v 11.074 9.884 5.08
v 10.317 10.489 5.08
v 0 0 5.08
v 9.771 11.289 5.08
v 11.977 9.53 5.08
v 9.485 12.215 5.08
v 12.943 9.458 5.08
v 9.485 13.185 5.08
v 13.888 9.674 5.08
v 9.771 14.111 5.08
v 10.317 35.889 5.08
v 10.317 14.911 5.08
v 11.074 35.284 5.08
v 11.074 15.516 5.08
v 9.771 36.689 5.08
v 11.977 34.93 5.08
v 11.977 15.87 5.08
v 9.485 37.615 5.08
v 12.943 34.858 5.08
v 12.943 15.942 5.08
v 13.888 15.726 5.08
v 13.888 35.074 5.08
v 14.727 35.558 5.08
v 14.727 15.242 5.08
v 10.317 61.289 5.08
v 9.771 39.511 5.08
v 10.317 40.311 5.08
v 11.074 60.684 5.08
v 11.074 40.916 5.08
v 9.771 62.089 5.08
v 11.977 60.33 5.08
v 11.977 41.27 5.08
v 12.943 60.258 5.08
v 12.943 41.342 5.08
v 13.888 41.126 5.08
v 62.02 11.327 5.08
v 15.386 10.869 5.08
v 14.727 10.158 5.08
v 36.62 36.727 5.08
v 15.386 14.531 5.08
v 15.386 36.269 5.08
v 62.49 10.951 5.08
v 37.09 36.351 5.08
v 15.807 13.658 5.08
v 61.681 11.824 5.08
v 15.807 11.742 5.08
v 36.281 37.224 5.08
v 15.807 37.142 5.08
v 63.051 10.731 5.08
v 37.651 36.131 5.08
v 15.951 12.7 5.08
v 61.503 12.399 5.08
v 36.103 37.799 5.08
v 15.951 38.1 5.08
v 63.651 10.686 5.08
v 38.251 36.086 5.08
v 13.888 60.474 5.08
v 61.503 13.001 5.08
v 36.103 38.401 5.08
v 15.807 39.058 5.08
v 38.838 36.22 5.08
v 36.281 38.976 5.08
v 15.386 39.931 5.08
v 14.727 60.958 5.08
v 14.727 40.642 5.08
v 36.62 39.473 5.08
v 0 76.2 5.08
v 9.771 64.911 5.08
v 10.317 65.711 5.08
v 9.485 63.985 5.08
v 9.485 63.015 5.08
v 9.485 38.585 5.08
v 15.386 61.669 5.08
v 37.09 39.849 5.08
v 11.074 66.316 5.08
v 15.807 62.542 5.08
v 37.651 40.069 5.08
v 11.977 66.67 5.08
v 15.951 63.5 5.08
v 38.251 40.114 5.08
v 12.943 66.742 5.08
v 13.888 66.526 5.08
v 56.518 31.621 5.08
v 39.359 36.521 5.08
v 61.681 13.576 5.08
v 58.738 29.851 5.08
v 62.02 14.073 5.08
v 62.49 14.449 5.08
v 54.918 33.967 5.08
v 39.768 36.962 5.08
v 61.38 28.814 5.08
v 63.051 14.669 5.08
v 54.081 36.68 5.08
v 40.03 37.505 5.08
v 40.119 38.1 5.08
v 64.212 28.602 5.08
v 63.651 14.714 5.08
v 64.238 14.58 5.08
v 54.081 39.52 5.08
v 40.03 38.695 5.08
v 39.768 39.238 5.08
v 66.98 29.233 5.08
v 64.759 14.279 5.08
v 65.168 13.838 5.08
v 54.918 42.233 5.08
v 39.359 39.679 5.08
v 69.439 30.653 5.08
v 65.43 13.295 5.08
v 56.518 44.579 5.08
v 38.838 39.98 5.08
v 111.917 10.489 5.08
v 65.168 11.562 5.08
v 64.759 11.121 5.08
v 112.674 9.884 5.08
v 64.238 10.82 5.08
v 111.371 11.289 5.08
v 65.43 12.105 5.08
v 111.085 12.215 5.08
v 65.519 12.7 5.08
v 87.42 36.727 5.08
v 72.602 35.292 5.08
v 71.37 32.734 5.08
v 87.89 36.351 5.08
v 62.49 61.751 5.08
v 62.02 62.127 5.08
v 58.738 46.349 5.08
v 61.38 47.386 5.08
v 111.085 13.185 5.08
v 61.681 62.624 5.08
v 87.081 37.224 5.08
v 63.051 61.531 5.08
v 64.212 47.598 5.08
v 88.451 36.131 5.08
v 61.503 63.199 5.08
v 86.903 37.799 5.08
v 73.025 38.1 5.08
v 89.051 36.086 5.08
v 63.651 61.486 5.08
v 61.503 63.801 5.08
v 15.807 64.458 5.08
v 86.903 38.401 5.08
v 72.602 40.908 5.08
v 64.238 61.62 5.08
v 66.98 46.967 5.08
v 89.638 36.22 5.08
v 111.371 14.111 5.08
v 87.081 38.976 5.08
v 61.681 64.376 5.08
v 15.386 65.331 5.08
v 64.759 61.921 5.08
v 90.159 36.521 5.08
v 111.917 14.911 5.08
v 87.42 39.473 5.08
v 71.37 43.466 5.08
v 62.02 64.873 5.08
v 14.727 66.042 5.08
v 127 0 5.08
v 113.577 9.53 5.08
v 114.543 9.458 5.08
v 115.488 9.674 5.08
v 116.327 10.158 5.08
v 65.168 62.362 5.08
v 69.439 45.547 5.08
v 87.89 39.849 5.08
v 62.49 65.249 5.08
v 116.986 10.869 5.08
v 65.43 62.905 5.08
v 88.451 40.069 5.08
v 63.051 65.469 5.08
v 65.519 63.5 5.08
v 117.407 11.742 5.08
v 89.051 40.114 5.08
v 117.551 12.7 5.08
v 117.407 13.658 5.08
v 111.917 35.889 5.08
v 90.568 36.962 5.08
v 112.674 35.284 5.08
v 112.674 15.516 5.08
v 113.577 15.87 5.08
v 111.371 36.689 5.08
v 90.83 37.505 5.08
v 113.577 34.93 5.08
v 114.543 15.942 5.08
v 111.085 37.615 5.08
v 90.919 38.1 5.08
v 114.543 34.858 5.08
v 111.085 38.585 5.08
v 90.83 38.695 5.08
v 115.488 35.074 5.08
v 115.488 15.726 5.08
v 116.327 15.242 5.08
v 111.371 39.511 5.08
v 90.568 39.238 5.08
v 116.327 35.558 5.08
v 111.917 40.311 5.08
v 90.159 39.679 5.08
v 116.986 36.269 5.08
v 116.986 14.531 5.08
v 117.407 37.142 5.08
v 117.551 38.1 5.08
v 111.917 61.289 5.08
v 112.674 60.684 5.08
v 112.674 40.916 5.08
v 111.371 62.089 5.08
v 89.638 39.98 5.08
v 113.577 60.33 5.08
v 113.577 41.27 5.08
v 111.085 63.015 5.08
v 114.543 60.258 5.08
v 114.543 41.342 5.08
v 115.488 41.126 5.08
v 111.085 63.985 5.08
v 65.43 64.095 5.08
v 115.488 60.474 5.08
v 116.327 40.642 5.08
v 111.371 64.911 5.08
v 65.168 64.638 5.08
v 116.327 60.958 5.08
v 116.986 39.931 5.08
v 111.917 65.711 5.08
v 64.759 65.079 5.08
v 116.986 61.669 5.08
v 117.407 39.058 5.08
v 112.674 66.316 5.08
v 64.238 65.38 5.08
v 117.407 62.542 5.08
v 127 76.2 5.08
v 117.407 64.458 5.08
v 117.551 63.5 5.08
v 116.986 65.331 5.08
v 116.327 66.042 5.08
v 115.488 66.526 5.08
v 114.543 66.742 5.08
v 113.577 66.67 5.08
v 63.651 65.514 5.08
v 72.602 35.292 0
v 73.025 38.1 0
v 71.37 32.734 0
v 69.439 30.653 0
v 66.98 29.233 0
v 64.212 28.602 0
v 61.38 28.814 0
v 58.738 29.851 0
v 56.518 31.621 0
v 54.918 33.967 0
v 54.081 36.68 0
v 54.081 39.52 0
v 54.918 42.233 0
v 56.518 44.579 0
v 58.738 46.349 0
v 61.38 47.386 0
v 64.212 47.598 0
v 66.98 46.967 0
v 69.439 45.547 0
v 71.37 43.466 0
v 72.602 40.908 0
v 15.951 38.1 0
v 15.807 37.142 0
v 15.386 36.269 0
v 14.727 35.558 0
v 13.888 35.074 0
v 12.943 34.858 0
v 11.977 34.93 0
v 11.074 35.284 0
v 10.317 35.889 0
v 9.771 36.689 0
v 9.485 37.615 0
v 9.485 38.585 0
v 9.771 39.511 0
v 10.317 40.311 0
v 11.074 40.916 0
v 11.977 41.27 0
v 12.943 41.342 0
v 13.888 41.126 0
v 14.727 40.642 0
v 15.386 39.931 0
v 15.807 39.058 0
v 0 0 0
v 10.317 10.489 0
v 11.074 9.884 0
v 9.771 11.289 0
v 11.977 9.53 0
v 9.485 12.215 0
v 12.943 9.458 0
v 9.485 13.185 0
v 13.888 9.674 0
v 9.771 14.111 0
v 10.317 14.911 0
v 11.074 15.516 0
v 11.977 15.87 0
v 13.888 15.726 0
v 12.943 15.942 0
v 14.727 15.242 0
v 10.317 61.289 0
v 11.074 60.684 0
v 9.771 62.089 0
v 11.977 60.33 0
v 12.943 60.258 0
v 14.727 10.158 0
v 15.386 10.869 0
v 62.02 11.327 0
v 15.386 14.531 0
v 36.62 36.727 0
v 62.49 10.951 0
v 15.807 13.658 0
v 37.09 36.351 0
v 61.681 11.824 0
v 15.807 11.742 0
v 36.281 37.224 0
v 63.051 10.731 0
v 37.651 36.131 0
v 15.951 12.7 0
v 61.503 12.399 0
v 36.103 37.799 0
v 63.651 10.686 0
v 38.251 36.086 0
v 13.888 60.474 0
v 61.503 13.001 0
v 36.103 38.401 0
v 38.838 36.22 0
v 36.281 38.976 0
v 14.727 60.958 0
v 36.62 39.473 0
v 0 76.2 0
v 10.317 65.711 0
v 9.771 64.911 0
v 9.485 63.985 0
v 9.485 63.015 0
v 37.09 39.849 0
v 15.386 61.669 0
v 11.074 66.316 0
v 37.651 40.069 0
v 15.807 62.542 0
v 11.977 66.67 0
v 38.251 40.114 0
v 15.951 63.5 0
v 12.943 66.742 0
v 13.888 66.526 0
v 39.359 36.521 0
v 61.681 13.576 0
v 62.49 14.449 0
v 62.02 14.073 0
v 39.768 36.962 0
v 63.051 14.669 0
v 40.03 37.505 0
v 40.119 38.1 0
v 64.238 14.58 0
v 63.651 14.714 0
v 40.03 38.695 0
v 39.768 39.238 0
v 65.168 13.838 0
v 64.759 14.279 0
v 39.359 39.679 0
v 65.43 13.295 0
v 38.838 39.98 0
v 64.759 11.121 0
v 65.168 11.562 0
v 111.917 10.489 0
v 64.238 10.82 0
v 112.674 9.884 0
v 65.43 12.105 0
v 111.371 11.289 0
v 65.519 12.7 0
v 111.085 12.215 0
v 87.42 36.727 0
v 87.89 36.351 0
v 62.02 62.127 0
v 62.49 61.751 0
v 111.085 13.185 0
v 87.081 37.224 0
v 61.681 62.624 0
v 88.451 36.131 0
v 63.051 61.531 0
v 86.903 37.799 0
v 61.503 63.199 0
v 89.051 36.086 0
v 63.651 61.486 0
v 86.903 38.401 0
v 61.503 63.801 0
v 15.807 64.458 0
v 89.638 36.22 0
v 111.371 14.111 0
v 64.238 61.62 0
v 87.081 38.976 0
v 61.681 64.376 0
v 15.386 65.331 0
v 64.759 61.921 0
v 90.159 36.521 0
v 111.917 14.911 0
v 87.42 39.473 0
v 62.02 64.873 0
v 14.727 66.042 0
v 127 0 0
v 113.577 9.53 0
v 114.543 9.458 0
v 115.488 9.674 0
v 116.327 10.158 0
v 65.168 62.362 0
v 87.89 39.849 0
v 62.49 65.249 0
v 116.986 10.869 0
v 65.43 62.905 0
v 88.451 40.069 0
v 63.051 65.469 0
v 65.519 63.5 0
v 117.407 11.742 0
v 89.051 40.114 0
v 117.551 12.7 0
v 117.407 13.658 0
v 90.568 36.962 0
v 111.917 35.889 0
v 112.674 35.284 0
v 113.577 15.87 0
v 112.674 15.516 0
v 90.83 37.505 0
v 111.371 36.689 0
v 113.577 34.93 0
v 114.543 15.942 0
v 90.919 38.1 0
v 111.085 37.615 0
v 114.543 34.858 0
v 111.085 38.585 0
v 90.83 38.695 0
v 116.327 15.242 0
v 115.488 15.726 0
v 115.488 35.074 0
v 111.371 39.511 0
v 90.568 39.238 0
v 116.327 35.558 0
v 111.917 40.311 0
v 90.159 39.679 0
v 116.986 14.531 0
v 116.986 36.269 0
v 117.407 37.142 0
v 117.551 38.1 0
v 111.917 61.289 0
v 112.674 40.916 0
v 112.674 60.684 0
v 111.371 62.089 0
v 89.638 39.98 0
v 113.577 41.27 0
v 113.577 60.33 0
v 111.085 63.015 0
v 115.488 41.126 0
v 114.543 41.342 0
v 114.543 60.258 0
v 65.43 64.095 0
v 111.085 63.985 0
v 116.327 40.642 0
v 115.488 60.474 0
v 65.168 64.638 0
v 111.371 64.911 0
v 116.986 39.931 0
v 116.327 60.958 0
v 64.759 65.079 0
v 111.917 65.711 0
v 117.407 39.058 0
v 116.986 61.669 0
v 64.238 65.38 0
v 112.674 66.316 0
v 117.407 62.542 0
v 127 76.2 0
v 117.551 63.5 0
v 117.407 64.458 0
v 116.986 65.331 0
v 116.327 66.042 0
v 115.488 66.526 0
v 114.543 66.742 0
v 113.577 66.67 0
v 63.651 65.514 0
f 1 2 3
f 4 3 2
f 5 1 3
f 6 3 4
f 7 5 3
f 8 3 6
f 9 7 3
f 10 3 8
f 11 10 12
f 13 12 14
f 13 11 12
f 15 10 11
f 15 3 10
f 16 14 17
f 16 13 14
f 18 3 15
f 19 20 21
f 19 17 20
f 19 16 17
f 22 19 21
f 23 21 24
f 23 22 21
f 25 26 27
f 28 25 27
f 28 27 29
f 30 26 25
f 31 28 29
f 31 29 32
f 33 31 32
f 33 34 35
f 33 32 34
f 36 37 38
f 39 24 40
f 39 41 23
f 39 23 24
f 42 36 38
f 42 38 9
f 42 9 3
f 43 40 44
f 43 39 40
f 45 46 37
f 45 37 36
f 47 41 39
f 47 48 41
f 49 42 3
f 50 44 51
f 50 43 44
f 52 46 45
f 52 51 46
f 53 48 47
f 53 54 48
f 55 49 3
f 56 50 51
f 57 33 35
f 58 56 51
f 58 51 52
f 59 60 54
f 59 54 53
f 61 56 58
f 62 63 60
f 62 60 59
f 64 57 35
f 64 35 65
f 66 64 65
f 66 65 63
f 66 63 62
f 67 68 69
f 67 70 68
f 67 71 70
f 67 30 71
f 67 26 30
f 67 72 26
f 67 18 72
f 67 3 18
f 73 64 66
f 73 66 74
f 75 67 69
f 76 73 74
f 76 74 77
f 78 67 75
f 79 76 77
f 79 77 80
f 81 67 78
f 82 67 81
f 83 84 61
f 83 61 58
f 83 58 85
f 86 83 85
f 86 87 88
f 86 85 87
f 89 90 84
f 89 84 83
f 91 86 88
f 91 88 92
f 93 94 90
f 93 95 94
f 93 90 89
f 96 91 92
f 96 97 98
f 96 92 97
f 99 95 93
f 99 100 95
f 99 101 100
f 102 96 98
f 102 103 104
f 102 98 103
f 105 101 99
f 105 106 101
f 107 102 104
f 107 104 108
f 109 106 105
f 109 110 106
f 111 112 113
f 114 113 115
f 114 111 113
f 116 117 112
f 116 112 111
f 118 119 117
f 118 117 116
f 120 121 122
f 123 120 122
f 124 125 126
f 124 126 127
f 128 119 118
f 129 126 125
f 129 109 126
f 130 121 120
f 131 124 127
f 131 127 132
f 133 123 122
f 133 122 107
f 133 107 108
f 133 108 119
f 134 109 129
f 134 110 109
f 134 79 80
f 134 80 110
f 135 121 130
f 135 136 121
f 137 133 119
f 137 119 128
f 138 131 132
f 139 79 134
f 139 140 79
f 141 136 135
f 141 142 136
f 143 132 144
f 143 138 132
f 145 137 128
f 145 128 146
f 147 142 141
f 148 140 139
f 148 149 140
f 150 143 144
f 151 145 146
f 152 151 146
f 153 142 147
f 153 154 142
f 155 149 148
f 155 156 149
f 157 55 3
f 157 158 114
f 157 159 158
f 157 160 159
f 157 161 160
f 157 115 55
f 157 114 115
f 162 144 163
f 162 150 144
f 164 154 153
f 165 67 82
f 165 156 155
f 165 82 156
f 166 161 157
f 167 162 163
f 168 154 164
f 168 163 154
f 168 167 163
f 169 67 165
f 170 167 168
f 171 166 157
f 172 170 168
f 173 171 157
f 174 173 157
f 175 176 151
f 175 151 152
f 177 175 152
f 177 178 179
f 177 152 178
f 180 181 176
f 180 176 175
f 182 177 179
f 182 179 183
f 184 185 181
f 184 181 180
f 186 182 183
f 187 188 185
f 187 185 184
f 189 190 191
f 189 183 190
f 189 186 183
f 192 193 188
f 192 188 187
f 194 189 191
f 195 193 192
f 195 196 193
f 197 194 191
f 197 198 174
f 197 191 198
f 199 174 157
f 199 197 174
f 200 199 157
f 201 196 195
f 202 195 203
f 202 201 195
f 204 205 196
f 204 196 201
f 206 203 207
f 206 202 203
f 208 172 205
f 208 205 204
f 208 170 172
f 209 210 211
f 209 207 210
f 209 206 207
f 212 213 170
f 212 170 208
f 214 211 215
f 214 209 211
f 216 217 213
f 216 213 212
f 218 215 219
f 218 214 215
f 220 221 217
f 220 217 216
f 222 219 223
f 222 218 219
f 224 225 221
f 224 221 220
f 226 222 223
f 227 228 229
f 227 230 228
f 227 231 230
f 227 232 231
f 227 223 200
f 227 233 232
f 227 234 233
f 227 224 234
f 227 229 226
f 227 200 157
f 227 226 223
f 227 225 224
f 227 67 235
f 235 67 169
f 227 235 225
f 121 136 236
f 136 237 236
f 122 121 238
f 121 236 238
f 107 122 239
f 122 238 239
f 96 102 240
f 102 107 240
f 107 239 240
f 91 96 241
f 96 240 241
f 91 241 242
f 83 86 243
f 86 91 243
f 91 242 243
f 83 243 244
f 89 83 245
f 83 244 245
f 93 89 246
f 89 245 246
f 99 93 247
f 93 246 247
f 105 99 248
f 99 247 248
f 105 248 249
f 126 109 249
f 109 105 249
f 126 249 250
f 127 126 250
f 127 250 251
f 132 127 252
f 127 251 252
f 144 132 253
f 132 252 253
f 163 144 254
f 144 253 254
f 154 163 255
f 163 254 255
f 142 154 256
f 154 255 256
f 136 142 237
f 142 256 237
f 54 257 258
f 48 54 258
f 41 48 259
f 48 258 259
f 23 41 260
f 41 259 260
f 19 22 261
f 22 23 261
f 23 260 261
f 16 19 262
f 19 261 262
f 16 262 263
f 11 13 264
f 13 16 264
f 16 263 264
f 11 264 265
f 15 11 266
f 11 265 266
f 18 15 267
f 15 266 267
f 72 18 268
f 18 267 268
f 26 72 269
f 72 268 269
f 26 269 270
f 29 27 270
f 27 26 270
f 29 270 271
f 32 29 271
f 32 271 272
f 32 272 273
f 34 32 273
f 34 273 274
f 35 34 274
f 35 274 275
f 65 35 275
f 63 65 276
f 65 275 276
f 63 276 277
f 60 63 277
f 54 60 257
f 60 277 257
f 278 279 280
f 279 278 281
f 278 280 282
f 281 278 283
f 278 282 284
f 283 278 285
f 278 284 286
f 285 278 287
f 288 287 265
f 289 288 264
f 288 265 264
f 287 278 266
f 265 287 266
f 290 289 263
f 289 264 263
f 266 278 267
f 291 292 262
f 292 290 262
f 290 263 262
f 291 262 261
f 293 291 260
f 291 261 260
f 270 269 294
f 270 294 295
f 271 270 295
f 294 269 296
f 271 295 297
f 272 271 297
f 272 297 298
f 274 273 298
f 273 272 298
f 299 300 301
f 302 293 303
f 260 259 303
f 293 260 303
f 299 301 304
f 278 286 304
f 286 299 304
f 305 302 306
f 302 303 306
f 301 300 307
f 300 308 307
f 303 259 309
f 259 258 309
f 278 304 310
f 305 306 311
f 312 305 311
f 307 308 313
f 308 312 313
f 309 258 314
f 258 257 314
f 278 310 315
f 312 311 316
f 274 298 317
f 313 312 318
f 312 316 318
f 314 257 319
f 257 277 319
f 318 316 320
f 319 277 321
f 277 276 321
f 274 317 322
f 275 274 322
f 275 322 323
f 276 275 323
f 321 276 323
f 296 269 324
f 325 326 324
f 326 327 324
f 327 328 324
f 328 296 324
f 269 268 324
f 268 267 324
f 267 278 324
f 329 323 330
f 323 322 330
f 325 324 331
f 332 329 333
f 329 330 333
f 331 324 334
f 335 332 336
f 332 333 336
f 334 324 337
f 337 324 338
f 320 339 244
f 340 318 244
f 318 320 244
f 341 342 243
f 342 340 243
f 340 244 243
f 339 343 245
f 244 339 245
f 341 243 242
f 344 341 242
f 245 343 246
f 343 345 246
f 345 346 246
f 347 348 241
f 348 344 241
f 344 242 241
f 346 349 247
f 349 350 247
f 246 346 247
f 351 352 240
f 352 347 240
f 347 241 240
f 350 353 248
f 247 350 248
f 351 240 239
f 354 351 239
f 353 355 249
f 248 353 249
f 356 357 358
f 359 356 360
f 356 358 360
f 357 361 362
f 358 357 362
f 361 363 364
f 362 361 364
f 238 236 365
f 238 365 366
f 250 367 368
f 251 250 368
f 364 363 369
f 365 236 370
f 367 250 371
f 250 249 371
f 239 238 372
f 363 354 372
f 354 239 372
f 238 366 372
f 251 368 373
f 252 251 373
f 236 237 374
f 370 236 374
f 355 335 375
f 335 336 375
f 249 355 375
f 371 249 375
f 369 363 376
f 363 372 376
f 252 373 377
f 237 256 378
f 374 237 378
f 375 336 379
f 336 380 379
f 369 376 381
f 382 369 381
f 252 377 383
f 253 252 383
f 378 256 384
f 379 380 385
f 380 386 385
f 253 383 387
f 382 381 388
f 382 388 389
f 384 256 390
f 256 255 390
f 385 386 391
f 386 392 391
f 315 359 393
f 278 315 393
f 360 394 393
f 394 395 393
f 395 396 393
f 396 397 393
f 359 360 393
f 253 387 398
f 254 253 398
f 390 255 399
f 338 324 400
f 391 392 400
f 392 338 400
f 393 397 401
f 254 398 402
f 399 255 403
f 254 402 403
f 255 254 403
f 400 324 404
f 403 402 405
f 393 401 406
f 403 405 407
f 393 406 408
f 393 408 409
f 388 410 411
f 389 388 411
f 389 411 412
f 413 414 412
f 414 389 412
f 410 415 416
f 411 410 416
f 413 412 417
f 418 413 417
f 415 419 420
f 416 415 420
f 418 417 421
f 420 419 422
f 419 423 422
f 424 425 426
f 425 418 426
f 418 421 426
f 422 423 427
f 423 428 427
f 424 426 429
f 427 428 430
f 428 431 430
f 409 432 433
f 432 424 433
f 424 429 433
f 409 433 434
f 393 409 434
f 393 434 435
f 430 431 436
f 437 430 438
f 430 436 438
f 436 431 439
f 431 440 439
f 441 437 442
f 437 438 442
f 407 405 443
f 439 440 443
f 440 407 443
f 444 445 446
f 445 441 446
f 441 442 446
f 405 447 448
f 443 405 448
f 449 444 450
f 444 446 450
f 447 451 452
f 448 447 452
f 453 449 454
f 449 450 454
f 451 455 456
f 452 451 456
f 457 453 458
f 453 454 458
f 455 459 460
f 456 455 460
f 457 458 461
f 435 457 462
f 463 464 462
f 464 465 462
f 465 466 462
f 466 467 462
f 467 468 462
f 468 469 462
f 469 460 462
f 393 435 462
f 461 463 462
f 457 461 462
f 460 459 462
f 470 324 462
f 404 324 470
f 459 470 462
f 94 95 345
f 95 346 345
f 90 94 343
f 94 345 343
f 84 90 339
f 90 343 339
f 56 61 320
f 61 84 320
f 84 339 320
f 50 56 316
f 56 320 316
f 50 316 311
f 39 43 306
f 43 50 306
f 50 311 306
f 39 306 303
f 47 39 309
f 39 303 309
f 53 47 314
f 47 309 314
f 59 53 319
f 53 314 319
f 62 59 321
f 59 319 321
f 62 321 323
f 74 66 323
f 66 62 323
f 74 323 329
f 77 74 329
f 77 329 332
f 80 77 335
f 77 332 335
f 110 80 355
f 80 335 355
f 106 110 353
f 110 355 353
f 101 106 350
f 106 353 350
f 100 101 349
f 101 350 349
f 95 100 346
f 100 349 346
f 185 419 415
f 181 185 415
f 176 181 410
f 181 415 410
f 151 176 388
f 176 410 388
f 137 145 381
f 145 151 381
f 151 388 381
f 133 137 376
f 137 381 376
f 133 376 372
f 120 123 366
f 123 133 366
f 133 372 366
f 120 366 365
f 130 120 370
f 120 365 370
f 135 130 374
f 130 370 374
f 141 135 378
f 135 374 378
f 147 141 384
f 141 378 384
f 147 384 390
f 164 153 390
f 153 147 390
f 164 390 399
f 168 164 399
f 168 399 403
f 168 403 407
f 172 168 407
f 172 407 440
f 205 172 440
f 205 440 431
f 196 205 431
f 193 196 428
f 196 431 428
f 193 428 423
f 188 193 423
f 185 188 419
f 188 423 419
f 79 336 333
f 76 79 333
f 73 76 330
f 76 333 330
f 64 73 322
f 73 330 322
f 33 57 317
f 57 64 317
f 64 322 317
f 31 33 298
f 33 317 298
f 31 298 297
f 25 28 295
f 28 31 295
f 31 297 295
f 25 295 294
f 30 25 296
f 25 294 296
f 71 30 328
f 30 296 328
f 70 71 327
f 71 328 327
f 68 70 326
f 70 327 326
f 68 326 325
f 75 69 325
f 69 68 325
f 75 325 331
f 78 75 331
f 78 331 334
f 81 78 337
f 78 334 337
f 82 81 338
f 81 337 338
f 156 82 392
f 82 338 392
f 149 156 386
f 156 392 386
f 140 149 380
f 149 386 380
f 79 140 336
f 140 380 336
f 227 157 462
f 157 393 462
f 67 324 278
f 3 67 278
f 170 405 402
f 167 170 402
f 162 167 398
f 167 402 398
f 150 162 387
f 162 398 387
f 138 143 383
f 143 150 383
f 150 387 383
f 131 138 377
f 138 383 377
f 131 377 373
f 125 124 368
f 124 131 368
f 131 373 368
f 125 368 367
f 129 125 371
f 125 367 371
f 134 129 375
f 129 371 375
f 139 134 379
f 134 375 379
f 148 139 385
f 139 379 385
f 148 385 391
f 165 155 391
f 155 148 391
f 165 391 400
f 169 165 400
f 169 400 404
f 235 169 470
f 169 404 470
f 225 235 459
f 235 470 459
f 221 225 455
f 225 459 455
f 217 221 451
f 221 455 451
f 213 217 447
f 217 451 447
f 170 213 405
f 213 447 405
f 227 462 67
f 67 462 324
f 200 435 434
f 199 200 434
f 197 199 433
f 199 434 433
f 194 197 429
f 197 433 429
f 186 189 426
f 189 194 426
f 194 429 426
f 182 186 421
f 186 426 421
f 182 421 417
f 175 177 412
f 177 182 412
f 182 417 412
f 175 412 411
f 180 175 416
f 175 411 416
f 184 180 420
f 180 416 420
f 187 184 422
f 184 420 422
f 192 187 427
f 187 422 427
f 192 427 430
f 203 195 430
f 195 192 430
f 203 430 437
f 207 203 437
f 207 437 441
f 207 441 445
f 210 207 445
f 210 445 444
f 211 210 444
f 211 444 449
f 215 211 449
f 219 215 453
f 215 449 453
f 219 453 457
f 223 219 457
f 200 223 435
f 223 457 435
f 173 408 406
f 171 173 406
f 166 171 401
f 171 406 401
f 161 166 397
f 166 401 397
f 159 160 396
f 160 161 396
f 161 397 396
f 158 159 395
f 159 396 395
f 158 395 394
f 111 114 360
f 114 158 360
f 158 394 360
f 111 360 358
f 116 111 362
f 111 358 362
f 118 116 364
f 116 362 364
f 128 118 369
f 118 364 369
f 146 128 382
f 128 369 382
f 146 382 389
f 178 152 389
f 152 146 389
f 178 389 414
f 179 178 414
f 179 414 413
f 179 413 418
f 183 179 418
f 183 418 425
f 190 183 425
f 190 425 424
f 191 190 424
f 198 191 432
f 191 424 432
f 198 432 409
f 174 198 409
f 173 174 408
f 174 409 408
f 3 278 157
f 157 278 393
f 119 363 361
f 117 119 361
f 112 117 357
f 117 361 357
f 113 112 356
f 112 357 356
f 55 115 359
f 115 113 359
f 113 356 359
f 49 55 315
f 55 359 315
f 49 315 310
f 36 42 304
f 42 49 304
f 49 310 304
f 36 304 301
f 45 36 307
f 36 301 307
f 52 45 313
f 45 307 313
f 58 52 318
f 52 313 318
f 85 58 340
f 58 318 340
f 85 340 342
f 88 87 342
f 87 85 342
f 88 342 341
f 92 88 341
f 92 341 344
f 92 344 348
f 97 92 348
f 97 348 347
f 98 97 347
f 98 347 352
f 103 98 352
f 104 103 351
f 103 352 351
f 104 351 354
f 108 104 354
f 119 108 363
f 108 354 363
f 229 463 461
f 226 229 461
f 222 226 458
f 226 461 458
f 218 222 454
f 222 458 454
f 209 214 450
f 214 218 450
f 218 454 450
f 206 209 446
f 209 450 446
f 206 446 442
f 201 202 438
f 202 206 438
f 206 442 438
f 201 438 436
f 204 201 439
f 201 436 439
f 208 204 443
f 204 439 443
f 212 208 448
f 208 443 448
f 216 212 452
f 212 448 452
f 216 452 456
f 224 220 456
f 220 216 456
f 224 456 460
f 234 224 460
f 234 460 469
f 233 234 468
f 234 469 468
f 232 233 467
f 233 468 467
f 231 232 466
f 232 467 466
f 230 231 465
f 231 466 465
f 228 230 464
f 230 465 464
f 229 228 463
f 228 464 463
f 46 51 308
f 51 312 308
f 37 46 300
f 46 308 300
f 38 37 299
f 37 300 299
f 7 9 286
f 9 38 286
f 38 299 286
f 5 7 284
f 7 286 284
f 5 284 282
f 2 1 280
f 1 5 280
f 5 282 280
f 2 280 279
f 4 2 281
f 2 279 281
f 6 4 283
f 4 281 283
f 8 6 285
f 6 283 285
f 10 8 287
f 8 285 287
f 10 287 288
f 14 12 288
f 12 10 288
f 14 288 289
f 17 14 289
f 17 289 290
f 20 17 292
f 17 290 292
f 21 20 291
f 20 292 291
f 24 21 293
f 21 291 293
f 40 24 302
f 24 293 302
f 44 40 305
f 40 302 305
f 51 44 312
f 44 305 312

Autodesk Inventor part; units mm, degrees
ref_plane "YZ Plane" through (0, 0, 0) normal (1, 0, 0) x (0, 1, 0)
ref_plane "XZ Plane" through (0, 0, 0) normal (0, 1, 0) x (-1, 0, 0)
ref_plane "XY Plane" through (0, 0, 0) normal (0, 0, 1) x (1, 0, 0)
sketch "Sketch1" plane through (0, 0, 0) normal (0, 0, 1) x (1, 0, 0)
  line L0 (0, 0) -> (127, 0)
  line L1 (127, 0) -> (127, 76.2)
  line L2 (127, 76.2) -> (0, 76.2)
  line L3 (0, 76.2) -> (0, 0)
  circle A0 centre (63.5, 38.1) radius 9.525
  circle A1 centre (63.5, 63.5) radius 2.0193
  circle A2 centre (38.1, 38.1) radius 2.0193
  circle A3 centre (63.5, 12.7) radius 2.0193
  circle A4 centre (88.9, 38.1) radius 2.0193
  circle A5 centre (12.7, 63.5) radius 3.2512
  circle A6 centre (12.7, 38.1) radius 3.2512
  circle A7 centre (12.7, 12.7) radius 3.2512
  circle A8 centre (114.3, 63.5) radius 3.2512
  circle A9 centre (114.3, 38.1) radius 3.2512
  circle A10 centre (114.3, 12.7) radius 3.2512
  dimension "d0" = 127
  dimension "d1" = 76.2
  dimension "d2" = 19.05
  dimension "d3" = 38.1
  dimension "d4" = 63.5
  dimension "d5" = 4.0386
  dimension "d6" = 25.4
  dimension "d7" = 63.5
  dimension "d8" = 4.0386
  dimension "d9" = 25.4
  dimension "d10" = 38.1
  dimension "d13" = 50.8
  dimension "d20" = 50.8
  dimension "d25" = 6.5024
  dimension "d26" = 12.7
  dimension "d27" = 12.7
  dimension "d30" = 25.4
  dimension "d39" = 101.6
extrude "Extrusion2" add sketch "Sketch1" along normal blind 5.08
equation "\"d3\" = 0.5 * d1"
equation "\"d7\" = d4"
equation "\"d8\" = d5"
equation "\"d9\" = d6"
equation "\"d10\" = 0.5 * d1"
properties part number "Motor Mount Short"
